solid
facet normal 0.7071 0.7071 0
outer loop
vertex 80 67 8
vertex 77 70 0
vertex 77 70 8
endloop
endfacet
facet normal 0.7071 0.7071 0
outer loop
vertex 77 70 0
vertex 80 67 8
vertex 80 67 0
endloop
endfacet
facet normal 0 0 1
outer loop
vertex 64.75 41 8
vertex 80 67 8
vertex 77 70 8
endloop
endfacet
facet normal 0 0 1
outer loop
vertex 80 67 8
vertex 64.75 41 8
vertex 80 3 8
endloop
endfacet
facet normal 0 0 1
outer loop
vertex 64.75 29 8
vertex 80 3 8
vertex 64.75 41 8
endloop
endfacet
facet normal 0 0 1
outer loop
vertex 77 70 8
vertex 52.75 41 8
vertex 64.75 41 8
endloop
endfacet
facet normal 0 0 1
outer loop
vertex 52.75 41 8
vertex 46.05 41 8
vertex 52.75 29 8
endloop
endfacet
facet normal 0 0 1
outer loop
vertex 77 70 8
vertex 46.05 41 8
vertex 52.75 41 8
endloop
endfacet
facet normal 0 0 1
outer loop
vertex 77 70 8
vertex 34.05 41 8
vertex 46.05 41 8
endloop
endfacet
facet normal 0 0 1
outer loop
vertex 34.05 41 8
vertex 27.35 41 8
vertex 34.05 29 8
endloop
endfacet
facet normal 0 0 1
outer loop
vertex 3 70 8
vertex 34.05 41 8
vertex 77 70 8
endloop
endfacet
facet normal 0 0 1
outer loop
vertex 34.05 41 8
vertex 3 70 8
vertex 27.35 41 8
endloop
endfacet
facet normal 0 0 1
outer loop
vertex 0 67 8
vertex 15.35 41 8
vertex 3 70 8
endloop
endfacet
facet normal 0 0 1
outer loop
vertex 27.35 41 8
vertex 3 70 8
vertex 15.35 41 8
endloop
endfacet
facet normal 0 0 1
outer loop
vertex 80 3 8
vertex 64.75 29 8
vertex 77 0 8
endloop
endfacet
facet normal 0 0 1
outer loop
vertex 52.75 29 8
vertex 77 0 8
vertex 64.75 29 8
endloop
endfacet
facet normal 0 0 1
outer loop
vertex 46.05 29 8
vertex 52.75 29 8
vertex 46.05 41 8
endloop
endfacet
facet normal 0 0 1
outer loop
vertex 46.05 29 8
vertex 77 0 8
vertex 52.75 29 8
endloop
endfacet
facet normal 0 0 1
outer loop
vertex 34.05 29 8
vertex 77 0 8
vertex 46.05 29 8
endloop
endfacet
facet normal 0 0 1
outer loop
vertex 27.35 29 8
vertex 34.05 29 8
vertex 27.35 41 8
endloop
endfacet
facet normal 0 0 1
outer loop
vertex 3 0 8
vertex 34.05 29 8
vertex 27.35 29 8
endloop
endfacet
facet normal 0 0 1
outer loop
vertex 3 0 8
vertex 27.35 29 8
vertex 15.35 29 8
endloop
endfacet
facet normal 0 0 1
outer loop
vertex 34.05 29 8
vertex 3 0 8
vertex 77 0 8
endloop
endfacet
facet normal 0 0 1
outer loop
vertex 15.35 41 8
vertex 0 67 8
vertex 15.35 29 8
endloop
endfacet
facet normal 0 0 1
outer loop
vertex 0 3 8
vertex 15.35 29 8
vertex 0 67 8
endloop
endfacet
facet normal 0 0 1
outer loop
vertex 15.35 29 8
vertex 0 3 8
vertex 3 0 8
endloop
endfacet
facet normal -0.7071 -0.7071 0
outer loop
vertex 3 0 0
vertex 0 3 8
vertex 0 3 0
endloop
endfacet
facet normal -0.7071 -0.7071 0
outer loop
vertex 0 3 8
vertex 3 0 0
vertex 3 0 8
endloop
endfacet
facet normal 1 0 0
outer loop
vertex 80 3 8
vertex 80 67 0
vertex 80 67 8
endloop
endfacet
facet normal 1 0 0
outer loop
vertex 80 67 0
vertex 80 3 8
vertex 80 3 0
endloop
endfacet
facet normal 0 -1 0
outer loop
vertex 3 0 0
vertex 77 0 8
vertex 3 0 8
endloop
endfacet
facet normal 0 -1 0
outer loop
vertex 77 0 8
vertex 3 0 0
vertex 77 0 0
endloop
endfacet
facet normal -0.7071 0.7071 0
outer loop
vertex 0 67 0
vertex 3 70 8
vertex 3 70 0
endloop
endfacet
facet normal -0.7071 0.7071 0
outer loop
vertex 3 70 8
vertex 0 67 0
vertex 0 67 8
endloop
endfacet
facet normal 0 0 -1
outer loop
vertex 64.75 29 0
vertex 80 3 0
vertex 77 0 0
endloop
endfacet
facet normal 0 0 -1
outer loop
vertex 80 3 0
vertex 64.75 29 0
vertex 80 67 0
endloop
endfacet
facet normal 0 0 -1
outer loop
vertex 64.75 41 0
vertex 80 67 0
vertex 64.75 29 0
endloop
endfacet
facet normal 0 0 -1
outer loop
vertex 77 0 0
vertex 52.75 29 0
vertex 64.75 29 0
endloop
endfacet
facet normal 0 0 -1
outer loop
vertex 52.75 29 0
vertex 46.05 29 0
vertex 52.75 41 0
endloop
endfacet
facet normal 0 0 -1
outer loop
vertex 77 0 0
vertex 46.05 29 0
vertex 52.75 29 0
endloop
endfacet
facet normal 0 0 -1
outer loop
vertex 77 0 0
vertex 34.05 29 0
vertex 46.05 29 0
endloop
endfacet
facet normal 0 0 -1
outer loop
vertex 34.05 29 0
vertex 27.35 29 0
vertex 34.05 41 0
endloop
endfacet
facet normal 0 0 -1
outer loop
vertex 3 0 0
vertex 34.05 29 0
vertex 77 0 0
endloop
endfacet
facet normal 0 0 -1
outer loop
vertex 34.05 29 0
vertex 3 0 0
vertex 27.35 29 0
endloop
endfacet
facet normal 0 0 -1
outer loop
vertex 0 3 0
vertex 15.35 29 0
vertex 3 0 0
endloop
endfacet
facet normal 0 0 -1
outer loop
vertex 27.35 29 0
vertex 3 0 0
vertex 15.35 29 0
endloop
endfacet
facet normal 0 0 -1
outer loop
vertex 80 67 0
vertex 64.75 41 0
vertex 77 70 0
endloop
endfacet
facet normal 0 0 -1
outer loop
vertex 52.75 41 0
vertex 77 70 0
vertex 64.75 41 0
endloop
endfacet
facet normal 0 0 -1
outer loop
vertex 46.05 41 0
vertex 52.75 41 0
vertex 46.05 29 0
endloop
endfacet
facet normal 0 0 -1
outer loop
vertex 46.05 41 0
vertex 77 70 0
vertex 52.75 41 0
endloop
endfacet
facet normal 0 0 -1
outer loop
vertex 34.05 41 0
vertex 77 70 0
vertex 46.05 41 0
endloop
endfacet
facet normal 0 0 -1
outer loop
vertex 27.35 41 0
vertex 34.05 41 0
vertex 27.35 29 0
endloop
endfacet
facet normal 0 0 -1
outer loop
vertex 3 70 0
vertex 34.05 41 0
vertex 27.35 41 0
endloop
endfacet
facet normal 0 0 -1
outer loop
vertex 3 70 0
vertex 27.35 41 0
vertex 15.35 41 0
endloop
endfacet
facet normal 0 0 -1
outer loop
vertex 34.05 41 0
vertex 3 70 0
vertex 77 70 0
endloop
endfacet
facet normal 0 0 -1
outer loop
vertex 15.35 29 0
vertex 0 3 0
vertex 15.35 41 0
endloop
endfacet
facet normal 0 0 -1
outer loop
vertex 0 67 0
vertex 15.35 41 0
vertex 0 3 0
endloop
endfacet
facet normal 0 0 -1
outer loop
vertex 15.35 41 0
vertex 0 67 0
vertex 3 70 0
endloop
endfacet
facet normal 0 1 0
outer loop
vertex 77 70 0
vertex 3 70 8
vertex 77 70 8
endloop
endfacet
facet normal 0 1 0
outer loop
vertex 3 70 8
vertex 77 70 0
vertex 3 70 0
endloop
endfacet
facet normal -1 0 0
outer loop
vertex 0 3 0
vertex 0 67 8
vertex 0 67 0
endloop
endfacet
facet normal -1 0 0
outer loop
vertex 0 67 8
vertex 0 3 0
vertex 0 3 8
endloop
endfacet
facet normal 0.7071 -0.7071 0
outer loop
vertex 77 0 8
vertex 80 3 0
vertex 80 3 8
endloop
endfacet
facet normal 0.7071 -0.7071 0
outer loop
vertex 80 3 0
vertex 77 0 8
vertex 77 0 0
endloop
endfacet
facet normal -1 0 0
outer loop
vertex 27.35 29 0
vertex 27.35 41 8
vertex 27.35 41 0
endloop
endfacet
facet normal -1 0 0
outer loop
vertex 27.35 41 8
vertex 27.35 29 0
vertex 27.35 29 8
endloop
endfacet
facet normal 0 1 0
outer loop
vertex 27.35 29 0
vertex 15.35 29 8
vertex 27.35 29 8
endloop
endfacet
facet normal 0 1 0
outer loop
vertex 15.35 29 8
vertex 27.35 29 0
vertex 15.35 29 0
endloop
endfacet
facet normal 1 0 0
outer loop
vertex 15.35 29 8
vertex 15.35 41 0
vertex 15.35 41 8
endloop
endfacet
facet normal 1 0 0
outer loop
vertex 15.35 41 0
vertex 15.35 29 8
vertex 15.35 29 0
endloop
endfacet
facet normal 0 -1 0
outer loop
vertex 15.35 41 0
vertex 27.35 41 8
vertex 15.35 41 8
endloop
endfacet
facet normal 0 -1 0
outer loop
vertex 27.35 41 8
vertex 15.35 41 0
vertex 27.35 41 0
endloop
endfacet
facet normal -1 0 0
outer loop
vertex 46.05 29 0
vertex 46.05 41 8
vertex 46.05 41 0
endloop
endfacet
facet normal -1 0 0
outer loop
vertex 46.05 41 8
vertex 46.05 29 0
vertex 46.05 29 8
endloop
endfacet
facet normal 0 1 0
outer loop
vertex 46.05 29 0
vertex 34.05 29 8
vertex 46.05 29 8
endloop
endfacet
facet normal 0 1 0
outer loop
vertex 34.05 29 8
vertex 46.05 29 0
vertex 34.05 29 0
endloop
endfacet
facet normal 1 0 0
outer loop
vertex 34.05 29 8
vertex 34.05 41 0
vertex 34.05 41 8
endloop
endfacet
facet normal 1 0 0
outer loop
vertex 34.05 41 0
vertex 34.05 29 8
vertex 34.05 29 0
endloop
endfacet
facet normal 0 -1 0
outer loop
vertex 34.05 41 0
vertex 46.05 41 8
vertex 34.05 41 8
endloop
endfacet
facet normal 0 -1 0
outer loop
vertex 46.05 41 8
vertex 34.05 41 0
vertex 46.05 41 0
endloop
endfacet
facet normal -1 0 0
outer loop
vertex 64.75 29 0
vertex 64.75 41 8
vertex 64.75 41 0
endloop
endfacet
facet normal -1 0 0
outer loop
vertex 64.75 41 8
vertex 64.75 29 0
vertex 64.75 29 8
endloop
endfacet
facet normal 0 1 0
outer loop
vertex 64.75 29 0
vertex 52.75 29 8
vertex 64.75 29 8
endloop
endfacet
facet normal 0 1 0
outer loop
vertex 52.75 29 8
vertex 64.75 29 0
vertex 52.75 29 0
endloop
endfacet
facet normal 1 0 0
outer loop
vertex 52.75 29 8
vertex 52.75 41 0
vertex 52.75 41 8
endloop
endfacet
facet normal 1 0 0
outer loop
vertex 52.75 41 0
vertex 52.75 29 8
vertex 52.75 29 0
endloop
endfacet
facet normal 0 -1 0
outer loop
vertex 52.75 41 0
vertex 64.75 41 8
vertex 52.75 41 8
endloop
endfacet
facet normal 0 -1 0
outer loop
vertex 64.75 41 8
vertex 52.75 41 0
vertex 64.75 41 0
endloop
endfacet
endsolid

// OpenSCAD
$fn = 32;

// ----------------------------------------------------------------------
// Windowed plate: 3 voids, 80 x 70 x 8 mm
// ----------------------------------------------------------------------

// --- parameters (mm) ---
plate_l = 80;             // plate length, X
plate_w = 70;             // plate width, Y
plate_t = 8;              // plate thickness, Z
edge_margin = 12;         // wall from the plate edge to any window
windows = 3;              // number of windows in the row
win_l = 12;               // window length
win_w = 12;               // window width
win_pitch = 18.7;         // window pitch along X
depth_1 = 8;              // depth of void 1 (full thickness = through)
depth_2 = 8;              // depth of void 2 (full thickness = through)
depth_3 = 8;              // depth of void 3 (full thickness = through)
corner_c = 3;             // corner chamfer of the plate

profile = [[3, 0], [77, 0], [80, 3], [80, 67], [77, 70], [3, 70], [0, 67], [0, 3]];  // primary outline, 8 points, counter clockwise
void_1 = [[15.35, 29], [27.35, 29], [27.35, 41], [15.35, 41]];  // window 1 of the row, 4 points
void_2 = [[34.05, 29], [46.05, 29], [46.05, 41], [34.05, 41]];  // window 2 of the row, 4 points
void_3 = [[52.75, 29], [64.75, 29], [64.75, 41], [52.75, 41]];  // window 3 of the row, 4 points

// --- the one profile operation ---
difference() {
  linear_extrude(height = plate_t) polygon(points = profile);
  translate([0, 0, -1])
    linear_extrude(height = plate_t + 2) polygon(points = void_1);
  translate([0, 0, -1])
    linear_extrude(height = plate_t + 2) polygon(points = void_2);
  translate([0, 0, -1])
    linear_extrude(height = plate_t + 2) polygon(points = void_3);
}
